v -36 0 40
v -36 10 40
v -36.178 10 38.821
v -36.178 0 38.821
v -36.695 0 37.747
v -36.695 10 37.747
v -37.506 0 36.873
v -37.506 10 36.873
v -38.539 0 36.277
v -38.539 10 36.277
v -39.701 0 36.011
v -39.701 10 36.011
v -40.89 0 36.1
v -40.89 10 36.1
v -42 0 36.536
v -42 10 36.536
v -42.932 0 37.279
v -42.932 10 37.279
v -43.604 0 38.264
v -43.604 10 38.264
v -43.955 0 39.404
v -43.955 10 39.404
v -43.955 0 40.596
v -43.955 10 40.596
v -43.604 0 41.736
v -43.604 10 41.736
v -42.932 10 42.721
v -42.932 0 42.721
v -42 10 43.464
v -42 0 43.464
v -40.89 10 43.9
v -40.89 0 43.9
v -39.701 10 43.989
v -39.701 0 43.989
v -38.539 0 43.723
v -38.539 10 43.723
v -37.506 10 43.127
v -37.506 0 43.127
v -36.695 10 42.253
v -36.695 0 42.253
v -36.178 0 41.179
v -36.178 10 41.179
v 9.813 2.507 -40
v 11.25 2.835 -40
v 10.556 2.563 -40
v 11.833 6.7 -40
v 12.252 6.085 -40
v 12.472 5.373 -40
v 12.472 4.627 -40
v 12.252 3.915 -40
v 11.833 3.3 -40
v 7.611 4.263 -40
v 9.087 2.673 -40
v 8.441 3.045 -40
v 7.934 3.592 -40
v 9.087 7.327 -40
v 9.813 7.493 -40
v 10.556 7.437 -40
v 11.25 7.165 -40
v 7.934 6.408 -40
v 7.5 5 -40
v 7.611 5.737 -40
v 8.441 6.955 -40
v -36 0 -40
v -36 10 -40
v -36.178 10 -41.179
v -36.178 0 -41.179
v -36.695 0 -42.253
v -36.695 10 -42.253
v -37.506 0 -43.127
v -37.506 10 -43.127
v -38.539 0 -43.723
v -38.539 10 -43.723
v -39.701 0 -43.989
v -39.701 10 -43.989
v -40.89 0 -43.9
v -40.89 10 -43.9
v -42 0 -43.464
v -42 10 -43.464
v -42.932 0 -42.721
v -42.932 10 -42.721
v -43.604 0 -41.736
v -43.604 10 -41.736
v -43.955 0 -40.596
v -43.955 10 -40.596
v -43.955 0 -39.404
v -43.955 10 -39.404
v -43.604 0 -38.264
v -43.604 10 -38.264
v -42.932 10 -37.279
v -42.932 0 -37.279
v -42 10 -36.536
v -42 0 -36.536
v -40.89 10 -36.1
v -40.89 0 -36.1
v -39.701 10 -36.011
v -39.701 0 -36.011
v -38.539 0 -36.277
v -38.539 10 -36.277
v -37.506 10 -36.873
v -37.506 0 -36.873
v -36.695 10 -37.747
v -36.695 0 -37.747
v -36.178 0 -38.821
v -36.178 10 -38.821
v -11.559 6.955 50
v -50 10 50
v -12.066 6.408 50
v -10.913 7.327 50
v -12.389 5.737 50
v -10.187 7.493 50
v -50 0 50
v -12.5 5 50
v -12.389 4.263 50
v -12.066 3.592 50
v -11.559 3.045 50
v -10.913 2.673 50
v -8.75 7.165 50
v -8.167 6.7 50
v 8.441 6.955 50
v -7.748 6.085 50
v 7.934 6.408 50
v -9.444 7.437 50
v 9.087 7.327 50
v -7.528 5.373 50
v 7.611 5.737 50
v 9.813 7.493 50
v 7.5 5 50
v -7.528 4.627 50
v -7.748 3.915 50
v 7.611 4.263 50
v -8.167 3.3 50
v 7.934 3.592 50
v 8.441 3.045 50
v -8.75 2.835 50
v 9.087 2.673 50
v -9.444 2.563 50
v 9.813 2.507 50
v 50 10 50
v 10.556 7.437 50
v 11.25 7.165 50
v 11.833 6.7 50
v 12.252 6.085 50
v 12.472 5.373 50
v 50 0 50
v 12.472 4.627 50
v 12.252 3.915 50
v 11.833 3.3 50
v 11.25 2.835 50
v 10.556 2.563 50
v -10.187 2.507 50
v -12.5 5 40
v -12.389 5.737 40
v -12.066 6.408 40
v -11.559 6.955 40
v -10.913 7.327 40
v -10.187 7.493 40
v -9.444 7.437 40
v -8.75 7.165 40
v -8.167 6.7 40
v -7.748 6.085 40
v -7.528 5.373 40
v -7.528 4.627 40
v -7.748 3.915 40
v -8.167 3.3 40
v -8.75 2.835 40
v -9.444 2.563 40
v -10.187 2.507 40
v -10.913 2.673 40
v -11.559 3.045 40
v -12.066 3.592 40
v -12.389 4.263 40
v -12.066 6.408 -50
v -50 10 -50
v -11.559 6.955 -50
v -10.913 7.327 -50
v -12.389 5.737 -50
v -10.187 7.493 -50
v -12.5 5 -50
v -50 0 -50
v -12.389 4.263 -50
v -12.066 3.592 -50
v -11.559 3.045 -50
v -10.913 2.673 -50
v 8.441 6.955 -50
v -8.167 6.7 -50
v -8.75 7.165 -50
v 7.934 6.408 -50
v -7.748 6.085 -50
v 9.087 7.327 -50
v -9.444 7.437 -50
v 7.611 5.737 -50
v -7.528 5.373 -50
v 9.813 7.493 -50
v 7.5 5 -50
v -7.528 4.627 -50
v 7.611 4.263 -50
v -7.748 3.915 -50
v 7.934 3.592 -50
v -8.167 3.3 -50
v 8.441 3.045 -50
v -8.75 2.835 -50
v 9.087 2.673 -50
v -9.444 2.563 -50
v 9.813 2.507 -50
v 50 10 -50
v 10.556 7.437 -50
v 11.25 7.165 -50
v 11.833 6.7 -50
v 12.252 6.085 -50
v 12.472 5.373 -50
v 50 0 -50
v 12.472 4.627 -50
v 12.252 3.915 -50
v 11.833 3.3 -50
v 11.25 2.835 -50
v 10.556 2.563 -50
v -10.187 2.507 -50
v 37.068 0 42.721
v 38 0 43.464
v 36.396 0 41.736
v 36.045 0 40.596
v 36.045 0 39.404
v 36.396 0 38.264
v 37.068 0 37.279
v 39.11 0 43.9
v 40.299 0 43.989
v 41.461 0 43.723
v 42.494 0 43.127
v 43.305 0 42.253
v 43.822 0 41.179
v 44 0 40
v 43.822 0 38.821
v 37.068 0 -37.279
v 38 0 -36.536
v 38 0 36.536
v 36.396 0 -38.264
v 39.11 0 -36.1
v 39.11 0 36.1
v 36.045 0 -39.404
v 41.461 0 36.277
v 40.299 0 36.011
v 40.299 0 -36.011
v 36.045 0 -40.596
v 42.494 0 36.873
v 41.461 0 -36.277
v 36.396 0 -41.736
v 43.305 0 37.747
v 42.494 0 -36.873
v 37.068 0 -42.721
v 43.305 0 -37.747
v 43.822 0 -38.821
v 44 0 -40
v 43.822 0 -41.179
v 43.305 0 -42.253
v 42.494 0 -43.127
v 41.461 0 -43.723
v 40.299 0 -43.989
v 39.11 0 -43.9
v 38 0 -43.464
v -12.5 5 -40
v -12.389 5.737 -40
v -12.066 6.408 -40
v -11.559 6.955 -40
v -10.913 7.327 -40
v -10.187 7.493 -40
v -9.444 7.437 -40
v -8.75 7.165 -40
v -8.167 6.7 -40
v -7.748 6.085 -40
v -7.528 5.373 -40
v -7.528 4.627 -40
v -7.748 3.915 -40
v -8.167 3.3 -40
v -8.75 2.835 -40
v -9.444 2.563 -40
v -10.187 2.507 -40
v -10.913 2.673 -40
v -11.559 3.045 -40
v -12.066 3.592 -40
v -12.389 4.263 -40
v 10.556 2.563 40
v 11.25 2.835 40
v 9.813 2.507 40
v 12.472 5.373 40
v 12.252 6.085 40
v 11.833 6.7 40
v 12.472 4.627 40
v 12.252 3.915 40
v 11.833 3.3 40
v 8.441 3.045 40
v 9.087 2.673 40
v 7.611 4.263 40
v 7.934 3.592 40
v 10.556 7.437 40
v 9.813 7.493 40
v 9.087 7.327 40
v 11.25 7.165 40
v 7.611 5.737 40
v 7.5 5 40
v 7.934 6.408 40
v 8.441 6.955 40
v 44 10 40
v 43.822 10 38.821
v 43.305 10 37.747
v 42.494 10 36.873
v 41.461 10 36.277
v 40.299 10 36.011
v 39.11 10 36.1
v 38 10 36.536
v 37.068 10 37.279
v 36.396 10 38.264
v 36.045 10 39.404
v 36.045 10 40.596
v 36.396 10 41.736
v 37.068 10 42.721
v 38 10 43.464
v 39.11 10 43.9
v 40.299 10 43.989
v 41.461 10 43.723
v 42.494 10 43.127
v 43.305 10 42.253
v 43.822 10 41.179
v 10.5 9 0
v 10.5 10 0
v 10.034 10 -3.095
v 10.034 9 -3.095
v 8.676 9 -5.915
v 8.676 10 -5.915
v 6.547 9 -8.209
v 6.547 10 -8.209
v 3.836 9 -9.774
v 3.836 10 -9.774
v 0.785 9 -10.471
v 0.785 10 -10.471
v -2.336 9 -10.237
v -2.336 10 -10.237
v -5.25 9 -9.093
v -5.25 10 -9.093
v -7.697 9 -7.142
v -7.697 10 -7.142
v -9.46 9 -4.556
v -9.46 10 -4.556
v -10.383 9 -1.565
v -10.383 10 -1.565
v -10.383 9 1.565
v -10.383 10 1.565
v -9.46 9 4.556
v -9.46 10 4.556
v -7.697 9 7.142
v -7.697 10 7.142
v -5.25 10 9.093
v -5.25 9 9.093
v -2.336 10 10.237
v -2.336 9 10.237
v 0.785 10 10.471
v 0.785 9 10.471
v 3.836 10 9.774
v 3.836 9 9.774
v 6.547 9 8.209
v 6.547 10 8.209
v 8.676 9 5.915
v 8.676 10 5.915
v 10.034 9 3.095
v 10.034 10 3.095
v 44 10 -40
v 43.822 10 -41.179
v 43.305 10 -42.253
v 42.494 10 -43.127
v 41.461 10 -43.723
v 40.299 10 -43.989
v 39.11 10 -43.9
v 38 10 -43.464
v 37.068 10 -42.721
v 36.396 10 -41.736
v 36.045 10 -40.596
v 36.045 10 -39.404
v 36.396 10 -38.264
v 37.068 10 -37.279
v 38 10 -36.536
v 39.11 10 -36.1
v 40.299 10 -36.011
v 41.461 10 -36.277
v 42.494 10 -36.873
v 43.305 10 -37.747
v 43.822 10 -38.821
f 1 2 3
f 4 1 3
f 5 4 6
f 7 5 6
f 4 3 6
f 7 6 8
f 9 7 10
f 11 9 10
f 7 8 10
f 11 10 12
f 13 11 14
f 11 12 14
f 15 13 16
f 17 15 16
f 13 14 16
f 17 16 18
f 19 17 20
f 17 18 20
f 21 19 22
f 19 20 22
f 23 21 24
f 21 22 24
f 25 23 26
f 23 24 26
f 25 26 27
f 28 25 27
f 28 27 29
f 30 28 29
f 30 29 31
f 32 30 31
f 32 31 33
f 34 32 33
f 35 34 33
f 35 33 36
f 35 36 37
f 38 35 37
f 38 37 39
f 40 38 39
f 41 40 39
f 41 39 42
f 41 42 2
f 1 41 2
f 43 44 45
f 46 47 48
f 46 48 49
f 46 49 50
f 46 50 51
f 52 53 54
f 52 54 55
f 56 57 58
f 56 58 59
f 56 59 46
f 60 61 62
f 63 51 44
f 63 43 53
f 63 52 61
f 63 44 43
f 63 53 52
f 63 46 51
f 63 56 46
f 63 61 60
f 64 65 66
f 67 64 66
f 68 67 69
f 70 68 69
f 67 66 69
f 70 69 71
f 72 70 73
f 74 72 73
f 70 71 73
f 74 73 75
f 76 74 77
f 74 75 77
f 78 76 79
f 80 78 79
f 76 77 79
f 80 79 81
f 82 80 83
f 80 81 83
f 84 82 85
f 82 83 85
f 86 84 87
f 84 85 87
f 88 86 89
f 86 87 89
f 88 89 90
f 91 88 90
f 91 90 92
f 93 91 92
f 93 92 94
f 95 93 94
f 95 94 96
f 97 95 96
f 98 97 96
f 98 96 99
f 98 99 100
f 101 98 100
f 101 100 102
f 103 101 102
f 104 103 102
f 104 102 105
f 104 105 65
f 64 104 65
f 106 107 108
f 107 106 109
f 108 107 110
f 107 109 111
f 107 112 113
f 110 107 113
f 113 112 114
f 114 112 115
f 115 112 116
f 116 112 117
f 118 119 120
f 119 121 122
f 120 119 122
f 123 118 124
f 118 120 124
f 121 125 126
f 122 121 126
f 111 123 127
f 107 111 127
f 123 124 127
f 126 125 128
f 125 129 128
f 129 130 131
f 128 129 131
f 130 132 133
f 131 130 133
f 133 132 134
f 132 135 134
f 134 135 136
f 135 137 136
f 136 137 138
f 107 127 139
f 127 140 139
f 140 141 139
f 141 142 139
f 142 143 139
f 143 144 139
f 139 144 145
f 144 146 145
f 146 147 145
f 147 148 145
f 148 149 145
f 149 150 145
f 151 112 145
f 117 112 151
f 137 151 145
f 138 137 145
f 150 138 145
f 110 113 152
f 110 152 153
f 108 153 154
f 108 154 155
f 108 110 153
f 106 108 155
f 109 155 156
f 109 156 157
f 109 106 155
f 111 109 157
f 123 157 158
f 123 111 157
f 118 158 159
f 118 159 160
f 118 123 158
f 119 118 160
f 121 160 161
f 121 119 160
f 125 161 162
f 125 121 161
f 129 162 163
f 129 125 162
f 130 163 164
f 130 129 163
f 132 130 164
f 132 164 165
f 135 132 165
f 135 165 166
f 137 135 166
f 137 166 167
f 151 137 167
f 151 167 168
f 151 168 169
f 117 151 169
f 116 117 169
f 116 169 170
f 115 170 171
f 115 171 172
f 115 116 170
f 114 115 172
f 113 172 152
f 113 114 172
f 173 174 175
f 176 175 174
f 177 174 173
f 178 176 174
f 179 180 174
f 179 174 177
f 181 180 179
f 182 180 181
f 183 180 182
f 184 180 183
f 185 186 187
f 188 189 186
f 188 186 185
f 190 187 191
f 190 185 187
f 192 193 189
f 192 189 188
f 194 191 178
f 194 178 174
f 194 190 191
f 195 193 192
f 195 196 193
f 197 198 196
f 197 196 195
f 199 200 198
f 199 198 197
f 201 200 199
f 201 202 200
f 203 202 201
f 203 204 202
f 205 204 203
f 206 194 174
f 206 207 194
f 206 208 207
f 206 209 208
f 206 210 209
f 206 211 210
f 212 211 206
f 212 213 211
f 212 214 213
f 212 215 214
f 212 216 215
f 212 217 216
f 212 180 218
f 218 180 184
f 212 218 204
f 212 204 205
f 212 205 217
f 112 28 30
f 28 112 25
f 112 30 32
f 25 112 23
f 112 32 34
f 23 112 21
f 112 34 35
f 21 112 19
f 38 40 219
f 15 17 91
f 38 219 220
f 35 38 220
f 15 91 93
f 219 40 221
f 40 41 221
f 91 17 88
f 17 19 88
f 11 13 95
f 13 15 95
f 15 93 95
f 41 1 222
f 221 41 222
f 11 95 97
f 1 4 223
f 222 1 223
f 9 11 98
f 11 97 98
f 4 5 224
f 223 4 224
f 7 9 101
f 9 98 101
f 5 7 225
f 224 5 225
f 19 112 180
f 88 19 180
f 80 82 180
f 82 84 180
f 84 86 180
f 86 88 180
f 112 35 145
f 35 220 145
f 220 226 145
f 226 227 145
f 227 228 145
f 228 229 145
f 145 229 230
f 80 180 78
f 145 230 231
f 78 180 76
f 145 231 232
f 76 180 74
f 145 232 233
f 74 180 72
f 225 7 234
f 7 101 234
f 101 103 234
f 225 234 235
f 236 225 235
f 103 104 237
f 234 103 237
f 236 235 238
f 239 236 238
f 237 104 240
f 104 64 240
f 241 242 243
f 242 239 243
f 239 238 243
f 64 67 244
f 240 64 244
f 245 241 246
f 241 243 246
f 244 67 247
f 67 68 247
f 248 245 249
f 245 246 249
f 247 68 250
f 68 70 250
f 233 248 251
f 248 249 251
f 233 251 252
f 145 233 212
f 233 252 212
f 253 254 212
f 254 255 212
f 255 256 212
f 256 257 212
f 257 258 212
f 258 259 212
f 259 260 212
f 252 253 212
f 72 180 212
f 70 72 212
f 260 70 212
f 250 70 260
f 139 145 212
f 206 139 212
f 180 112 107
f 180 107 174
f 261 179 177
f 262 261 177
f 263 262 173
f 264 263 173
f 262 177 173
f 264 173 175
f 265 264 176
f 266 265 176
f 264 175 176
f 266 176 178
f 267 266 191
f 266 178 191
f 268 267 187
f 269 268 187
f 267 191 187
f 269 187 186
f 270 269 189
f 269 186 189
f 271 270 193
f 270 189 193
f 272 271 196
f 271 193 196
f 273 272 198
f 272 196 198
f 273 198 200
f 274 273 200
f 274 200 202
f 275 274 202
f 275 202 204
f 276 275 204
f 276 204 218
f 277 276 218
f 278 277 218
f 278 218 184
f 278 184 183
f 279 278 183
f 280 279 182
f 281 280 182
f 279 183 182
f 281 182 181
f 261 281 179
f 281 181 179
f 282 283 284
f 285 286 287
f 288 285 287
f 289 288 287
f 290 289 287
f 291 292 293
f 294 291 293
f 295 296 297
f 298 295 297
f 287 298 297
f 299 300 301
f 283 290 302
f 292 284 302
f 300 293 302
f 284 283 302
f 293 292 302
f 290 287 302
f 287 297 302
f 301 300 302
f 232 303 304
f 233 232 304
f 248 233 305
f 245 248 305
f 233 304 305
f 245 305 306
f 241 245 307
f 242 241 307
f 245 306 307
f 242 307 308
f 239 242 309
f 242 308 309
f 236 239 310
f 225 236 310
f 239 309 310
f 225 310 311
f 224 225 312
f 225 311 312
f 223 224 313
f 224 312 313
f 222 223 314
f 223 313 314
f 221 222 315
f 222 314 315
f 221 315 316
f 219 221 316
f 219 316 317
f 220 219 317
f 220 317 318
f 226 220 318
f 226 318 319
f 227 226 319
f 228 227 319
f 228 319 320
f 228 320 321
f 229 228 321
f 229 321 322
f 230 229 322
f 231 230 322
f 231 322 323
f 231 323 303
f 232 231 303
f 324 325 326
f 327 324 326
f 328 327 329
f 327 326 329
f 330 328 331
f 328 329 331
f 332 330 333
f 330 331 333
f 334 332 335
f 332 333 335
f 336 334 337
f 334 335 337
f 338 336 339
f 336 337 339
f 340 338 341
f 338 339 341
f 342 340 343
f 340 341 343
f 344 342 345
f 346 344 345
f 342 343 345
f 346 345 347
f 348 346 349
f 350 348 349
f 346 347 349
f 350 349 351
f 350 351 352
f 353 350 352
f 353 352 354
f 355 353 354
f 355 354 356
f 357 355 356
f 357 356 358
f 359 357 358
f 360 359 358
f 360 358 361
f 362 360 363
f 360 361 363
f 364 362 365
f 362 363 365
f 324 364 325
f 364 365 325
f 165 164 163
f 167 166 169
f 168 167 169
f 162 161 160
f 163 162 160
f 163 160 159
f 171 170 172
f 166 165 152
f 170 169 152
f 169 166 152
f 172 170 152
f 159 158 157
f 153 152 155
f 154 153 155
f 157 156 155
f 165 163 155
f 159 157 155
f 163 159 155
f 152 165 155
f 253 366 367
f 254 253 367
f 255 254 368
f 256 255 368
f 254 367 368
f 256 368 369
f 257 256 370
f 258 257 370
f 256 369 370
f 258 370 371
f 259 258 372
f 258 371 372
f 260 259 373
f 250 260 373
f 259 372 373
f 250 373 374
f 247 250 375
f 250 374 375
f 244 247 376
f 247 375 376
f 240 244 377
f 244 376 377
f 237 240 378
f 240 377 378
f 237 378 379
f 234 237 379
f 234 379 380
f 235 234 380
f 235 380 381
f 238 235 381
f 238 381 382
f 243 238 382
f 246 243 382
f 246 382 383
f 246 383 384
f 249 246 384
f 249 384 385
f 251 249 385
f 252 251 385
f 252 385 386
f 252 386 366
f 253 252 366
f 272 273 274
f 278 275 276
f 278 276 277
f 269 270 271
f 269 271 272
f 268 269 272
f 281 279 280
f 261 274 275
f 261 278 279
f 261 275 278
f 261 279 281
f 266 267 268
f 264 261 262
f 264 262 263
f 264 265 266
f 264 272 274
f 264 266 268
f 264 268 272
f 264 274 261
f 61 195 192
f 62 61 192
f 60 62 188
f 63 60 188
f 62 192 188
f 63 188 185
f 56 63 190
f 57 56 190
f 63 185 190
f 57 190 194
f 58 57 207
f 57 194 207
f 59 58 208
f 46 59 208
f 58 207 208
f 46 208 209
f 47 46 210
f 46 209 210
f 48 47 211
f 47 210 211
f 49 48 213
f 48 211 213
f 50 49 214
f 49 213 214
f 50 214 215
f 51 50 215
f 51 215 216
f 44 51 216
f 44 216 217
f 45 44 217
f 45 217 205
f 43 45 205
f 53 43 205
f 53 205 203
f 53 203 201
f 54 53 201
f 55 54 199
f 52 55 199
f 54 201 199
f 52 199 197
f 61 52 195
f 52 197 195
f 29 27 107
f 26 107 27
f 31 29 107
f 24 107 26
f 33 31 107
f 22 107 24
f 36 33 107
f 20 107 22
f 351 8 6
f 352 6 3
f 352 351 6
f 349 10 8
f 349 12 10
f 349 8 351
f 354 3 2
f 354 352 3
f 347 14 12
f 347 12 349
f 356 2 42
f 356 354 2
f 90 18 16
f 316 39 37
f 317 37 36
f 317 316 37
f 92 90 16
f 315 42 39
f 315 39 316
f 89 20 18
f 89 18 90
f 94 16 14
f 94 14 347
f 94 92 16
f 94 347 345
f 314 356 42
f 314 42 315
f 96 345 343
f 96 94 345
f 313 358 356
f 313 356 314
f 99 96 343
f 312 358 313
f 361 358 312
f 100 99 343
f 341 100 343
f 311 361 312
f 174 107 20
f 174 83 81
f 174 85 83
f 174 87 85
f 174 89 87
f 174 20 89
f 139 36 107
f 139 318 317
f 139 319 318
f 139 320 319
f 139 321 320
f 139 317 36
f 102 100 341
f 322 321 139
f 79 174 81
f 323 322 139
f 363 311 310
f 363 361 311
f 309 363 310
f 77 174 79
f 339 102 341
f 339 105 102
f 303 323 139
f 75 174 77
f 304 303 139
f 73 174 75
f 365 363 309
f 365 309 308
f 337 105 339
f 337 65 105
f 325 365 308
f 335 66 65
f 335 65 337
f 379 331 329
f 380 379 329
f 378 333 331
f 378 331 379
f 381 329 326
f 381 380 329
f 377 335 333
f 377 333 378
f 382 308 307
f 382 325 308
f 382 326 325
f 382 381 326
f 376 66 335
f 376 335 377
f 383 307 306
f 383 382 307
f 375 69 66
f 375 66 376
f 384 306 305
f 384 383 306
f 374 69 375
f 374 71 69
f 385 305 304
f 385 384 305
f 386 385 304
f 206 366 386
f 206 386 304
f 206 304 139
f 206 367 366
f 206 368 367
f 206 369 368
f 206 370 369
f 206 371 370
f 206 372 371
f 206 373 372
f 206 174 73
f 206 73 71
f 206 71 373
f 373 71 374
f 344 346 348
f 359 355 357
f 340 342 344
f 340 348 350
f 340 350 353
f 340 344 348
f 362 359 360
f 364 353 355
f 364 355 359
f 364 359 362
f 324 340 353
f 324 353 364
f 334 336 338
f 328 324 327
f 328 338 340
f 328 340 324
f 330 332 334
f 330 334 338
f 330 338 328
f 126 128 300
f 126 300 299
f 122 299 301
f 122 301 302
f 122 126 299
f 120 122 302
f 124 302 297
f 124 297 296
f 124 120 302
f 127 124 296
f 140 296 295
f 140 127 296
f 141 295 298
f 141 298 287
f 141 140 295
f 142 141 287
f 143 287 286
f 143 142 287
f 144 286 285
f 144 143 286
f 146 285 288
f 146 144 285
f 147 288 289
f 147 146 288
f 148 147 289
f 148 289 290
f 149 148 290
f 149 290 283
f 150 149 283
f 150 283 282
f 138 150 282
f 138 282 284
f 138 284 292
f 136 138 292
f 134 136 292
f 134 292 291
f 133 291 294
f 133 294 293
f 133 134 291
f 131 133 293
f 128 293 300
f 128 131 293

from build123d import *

# Parameters (mm, degrees)
SKETCH1_W           = 100
SKETCH1_H           = 100
BASE_DEPTH          = 10
SKETCH2_R           = 10.5
LOAD_CELL_CUT_DEPTH = 1
CUT_EXTRUDE1_REACH  = 12
SKETCH15_R          = 3
SKETCH21_R          = 2.5
CUT_EXTRUDE2_DEPTH  = 10
SKETCH22_R          = 4
CUT_EXTRUDE3_DEPTH  = 11


with BuildPart() as part:
    # Sketch1 → base (new body)
    with BuildSketch(Plane(origin=(0, 0, 0), x_dir=(1, 0, 0), z_dir=(0, 1, 0))):
        Rectangle(SKETCH1_W, SKETCH1_H)
    extrude(amount=BASE_DEPTH)

    # Sketch2 → load cell cut (cut)
    with BuildSketch(Plane(origin=(0, 10, 0), x_dir=(1, 0, 0), z_dir=(0, 1, 0))):
        Circle(SKETCH2_R)
    extrude(amount=-LOAD_CELL_CUT_DEPTH, mode=Mode.SUBTRACT)

    # Sketch15 → Cut-Extrude1 (cut, up to next)
    with BuildSketch(Plane(origin=(0, 0, 0), x_dir=(-1, 0, 0), z_dir=(0, -1, 0)), mode=Mode.PRIVATE) as cut_extrude1_sk1:
        with Locations((40, -40)):
            Circle(SKETCH15_R)
    cut_extrude1_tool1 = extrude(cut_extrude1_sk1.sketch, amount=-CUT_EXTRUDE1_REACH, mode=Mode.PRIVATE) & part.part
    add(cut_extrude1_tool1.solids().sort_by_distance((-40, 0, 40))[0], mode=Mode.SUBTRACT)
    # Sketch15 → Cut-Extrude1 (cut, up to next)
    with BuildSketch(Plane(origin=(0, 0, 0), x_dir=(-1, 0, 0), z_dir=(0, -1, 0)), mode=Mode.PRIVATE) as cut_extrude1_sk2:
        with Locations((-40, -40)):
            Circle(SKETCH15_R)
    cut_extrude1_tool2 = extrude(cut_extrude1_sk2.sketch, amount=-CUT_EXTRUDE1_REACH, mode=Mode.PRIVATE) & part.part
    add(cut_extrude1_tool2.solids().sort_by_distance((40, 0, 40))[0], mode=Mode.SUBTRACT)
    # Sketch15 → Cut-Extrude1 (cut, up to next)
    with BuildSketch(Plane(origin=(0, 0, 0), x_dir=(-1, 0, 0), z_dir=(0, -1, 0)), mode=Mode.PRIVATE) as cut_extrude1_sk3:
        with Locations((40, 40)):
            Circle(SKETCH15_R)
    cut_extrude1_tool3 = extrude(cut_extrude1_sk3.sketch, amount=-CUT_EXTRUDE1_REACH, mode=Mode.PRIVATE) & part.part
    add(cut_extrude1_tool3.solids().sort_by_distance((-40, 0, -40))[0], mode=Mode.SUBTRACT)
    # Sketch15 → Cut-Extrude1 (cut, up to next)
    with BuildSketch(Plane(origin=(0, 0, 0), x_dir=(-1, 0, 0), z_dir=(0, -1, 0)), mode=Mode.PRIVATE) as cut_extrude1_sk4:
        with Locations((-40, 40)):
            Circle(SKETCH15_R)
    cut_extrude1_tool4 = extrude(cut_extrude1_sk4.sketch, amount=-CUT_EXTRUDE1_REACH, mode=Mode.PRIVATE) & part.part
    add(cut_extrude1_tool4.solids().sort_by_distance((40, 0, -40))[0], mode=Mode.SUBTRACT)

    # Sketch21 → Cut-Extrude2 (cut)
    with BuildSketch(Plane(origin=(0, 0, -50), x_dir=(-1, 0, 0), z_dir=(0, 0, -1))):
        with Locations((-10, 5)):
            Circle(SKETCH21_R)
        with Locations((10, 5)):
            Circle(SKETCH21_R)
    cut_extrude2 = extrude(amount=-CUT_EXTRUDE2_DEPTH, mode=Mode.SUBTRACT)

    # Mirror2: Cut-Extrude2 across plane
    add(cut_extrude2.mirror(Plane.XY), mode=Mode.SUBTRACT)

    # Sketch22 → Cut-Extrude3 (cut, through all)
    with BuildSketch(Plane(origin=(0, 10, 0), x_dir=(1, 0, 0), z_dir=(0, 1, 0))):
        with Locations((40, -40)):
            Circle(SKETCH22_R)
        with Locations((-40, -40)):
            Circle(SKETCH22_R)
        with Locations((-40, 40)):
            Circle(SKETCH22_R)
        with Locations((40, 40)):
            Circle(SKETCH22_R)
    extrude(amount=-CUT_EXTRUDE3_DEPTH, mode=Mode.SUBTRACT)


solid = part.part
